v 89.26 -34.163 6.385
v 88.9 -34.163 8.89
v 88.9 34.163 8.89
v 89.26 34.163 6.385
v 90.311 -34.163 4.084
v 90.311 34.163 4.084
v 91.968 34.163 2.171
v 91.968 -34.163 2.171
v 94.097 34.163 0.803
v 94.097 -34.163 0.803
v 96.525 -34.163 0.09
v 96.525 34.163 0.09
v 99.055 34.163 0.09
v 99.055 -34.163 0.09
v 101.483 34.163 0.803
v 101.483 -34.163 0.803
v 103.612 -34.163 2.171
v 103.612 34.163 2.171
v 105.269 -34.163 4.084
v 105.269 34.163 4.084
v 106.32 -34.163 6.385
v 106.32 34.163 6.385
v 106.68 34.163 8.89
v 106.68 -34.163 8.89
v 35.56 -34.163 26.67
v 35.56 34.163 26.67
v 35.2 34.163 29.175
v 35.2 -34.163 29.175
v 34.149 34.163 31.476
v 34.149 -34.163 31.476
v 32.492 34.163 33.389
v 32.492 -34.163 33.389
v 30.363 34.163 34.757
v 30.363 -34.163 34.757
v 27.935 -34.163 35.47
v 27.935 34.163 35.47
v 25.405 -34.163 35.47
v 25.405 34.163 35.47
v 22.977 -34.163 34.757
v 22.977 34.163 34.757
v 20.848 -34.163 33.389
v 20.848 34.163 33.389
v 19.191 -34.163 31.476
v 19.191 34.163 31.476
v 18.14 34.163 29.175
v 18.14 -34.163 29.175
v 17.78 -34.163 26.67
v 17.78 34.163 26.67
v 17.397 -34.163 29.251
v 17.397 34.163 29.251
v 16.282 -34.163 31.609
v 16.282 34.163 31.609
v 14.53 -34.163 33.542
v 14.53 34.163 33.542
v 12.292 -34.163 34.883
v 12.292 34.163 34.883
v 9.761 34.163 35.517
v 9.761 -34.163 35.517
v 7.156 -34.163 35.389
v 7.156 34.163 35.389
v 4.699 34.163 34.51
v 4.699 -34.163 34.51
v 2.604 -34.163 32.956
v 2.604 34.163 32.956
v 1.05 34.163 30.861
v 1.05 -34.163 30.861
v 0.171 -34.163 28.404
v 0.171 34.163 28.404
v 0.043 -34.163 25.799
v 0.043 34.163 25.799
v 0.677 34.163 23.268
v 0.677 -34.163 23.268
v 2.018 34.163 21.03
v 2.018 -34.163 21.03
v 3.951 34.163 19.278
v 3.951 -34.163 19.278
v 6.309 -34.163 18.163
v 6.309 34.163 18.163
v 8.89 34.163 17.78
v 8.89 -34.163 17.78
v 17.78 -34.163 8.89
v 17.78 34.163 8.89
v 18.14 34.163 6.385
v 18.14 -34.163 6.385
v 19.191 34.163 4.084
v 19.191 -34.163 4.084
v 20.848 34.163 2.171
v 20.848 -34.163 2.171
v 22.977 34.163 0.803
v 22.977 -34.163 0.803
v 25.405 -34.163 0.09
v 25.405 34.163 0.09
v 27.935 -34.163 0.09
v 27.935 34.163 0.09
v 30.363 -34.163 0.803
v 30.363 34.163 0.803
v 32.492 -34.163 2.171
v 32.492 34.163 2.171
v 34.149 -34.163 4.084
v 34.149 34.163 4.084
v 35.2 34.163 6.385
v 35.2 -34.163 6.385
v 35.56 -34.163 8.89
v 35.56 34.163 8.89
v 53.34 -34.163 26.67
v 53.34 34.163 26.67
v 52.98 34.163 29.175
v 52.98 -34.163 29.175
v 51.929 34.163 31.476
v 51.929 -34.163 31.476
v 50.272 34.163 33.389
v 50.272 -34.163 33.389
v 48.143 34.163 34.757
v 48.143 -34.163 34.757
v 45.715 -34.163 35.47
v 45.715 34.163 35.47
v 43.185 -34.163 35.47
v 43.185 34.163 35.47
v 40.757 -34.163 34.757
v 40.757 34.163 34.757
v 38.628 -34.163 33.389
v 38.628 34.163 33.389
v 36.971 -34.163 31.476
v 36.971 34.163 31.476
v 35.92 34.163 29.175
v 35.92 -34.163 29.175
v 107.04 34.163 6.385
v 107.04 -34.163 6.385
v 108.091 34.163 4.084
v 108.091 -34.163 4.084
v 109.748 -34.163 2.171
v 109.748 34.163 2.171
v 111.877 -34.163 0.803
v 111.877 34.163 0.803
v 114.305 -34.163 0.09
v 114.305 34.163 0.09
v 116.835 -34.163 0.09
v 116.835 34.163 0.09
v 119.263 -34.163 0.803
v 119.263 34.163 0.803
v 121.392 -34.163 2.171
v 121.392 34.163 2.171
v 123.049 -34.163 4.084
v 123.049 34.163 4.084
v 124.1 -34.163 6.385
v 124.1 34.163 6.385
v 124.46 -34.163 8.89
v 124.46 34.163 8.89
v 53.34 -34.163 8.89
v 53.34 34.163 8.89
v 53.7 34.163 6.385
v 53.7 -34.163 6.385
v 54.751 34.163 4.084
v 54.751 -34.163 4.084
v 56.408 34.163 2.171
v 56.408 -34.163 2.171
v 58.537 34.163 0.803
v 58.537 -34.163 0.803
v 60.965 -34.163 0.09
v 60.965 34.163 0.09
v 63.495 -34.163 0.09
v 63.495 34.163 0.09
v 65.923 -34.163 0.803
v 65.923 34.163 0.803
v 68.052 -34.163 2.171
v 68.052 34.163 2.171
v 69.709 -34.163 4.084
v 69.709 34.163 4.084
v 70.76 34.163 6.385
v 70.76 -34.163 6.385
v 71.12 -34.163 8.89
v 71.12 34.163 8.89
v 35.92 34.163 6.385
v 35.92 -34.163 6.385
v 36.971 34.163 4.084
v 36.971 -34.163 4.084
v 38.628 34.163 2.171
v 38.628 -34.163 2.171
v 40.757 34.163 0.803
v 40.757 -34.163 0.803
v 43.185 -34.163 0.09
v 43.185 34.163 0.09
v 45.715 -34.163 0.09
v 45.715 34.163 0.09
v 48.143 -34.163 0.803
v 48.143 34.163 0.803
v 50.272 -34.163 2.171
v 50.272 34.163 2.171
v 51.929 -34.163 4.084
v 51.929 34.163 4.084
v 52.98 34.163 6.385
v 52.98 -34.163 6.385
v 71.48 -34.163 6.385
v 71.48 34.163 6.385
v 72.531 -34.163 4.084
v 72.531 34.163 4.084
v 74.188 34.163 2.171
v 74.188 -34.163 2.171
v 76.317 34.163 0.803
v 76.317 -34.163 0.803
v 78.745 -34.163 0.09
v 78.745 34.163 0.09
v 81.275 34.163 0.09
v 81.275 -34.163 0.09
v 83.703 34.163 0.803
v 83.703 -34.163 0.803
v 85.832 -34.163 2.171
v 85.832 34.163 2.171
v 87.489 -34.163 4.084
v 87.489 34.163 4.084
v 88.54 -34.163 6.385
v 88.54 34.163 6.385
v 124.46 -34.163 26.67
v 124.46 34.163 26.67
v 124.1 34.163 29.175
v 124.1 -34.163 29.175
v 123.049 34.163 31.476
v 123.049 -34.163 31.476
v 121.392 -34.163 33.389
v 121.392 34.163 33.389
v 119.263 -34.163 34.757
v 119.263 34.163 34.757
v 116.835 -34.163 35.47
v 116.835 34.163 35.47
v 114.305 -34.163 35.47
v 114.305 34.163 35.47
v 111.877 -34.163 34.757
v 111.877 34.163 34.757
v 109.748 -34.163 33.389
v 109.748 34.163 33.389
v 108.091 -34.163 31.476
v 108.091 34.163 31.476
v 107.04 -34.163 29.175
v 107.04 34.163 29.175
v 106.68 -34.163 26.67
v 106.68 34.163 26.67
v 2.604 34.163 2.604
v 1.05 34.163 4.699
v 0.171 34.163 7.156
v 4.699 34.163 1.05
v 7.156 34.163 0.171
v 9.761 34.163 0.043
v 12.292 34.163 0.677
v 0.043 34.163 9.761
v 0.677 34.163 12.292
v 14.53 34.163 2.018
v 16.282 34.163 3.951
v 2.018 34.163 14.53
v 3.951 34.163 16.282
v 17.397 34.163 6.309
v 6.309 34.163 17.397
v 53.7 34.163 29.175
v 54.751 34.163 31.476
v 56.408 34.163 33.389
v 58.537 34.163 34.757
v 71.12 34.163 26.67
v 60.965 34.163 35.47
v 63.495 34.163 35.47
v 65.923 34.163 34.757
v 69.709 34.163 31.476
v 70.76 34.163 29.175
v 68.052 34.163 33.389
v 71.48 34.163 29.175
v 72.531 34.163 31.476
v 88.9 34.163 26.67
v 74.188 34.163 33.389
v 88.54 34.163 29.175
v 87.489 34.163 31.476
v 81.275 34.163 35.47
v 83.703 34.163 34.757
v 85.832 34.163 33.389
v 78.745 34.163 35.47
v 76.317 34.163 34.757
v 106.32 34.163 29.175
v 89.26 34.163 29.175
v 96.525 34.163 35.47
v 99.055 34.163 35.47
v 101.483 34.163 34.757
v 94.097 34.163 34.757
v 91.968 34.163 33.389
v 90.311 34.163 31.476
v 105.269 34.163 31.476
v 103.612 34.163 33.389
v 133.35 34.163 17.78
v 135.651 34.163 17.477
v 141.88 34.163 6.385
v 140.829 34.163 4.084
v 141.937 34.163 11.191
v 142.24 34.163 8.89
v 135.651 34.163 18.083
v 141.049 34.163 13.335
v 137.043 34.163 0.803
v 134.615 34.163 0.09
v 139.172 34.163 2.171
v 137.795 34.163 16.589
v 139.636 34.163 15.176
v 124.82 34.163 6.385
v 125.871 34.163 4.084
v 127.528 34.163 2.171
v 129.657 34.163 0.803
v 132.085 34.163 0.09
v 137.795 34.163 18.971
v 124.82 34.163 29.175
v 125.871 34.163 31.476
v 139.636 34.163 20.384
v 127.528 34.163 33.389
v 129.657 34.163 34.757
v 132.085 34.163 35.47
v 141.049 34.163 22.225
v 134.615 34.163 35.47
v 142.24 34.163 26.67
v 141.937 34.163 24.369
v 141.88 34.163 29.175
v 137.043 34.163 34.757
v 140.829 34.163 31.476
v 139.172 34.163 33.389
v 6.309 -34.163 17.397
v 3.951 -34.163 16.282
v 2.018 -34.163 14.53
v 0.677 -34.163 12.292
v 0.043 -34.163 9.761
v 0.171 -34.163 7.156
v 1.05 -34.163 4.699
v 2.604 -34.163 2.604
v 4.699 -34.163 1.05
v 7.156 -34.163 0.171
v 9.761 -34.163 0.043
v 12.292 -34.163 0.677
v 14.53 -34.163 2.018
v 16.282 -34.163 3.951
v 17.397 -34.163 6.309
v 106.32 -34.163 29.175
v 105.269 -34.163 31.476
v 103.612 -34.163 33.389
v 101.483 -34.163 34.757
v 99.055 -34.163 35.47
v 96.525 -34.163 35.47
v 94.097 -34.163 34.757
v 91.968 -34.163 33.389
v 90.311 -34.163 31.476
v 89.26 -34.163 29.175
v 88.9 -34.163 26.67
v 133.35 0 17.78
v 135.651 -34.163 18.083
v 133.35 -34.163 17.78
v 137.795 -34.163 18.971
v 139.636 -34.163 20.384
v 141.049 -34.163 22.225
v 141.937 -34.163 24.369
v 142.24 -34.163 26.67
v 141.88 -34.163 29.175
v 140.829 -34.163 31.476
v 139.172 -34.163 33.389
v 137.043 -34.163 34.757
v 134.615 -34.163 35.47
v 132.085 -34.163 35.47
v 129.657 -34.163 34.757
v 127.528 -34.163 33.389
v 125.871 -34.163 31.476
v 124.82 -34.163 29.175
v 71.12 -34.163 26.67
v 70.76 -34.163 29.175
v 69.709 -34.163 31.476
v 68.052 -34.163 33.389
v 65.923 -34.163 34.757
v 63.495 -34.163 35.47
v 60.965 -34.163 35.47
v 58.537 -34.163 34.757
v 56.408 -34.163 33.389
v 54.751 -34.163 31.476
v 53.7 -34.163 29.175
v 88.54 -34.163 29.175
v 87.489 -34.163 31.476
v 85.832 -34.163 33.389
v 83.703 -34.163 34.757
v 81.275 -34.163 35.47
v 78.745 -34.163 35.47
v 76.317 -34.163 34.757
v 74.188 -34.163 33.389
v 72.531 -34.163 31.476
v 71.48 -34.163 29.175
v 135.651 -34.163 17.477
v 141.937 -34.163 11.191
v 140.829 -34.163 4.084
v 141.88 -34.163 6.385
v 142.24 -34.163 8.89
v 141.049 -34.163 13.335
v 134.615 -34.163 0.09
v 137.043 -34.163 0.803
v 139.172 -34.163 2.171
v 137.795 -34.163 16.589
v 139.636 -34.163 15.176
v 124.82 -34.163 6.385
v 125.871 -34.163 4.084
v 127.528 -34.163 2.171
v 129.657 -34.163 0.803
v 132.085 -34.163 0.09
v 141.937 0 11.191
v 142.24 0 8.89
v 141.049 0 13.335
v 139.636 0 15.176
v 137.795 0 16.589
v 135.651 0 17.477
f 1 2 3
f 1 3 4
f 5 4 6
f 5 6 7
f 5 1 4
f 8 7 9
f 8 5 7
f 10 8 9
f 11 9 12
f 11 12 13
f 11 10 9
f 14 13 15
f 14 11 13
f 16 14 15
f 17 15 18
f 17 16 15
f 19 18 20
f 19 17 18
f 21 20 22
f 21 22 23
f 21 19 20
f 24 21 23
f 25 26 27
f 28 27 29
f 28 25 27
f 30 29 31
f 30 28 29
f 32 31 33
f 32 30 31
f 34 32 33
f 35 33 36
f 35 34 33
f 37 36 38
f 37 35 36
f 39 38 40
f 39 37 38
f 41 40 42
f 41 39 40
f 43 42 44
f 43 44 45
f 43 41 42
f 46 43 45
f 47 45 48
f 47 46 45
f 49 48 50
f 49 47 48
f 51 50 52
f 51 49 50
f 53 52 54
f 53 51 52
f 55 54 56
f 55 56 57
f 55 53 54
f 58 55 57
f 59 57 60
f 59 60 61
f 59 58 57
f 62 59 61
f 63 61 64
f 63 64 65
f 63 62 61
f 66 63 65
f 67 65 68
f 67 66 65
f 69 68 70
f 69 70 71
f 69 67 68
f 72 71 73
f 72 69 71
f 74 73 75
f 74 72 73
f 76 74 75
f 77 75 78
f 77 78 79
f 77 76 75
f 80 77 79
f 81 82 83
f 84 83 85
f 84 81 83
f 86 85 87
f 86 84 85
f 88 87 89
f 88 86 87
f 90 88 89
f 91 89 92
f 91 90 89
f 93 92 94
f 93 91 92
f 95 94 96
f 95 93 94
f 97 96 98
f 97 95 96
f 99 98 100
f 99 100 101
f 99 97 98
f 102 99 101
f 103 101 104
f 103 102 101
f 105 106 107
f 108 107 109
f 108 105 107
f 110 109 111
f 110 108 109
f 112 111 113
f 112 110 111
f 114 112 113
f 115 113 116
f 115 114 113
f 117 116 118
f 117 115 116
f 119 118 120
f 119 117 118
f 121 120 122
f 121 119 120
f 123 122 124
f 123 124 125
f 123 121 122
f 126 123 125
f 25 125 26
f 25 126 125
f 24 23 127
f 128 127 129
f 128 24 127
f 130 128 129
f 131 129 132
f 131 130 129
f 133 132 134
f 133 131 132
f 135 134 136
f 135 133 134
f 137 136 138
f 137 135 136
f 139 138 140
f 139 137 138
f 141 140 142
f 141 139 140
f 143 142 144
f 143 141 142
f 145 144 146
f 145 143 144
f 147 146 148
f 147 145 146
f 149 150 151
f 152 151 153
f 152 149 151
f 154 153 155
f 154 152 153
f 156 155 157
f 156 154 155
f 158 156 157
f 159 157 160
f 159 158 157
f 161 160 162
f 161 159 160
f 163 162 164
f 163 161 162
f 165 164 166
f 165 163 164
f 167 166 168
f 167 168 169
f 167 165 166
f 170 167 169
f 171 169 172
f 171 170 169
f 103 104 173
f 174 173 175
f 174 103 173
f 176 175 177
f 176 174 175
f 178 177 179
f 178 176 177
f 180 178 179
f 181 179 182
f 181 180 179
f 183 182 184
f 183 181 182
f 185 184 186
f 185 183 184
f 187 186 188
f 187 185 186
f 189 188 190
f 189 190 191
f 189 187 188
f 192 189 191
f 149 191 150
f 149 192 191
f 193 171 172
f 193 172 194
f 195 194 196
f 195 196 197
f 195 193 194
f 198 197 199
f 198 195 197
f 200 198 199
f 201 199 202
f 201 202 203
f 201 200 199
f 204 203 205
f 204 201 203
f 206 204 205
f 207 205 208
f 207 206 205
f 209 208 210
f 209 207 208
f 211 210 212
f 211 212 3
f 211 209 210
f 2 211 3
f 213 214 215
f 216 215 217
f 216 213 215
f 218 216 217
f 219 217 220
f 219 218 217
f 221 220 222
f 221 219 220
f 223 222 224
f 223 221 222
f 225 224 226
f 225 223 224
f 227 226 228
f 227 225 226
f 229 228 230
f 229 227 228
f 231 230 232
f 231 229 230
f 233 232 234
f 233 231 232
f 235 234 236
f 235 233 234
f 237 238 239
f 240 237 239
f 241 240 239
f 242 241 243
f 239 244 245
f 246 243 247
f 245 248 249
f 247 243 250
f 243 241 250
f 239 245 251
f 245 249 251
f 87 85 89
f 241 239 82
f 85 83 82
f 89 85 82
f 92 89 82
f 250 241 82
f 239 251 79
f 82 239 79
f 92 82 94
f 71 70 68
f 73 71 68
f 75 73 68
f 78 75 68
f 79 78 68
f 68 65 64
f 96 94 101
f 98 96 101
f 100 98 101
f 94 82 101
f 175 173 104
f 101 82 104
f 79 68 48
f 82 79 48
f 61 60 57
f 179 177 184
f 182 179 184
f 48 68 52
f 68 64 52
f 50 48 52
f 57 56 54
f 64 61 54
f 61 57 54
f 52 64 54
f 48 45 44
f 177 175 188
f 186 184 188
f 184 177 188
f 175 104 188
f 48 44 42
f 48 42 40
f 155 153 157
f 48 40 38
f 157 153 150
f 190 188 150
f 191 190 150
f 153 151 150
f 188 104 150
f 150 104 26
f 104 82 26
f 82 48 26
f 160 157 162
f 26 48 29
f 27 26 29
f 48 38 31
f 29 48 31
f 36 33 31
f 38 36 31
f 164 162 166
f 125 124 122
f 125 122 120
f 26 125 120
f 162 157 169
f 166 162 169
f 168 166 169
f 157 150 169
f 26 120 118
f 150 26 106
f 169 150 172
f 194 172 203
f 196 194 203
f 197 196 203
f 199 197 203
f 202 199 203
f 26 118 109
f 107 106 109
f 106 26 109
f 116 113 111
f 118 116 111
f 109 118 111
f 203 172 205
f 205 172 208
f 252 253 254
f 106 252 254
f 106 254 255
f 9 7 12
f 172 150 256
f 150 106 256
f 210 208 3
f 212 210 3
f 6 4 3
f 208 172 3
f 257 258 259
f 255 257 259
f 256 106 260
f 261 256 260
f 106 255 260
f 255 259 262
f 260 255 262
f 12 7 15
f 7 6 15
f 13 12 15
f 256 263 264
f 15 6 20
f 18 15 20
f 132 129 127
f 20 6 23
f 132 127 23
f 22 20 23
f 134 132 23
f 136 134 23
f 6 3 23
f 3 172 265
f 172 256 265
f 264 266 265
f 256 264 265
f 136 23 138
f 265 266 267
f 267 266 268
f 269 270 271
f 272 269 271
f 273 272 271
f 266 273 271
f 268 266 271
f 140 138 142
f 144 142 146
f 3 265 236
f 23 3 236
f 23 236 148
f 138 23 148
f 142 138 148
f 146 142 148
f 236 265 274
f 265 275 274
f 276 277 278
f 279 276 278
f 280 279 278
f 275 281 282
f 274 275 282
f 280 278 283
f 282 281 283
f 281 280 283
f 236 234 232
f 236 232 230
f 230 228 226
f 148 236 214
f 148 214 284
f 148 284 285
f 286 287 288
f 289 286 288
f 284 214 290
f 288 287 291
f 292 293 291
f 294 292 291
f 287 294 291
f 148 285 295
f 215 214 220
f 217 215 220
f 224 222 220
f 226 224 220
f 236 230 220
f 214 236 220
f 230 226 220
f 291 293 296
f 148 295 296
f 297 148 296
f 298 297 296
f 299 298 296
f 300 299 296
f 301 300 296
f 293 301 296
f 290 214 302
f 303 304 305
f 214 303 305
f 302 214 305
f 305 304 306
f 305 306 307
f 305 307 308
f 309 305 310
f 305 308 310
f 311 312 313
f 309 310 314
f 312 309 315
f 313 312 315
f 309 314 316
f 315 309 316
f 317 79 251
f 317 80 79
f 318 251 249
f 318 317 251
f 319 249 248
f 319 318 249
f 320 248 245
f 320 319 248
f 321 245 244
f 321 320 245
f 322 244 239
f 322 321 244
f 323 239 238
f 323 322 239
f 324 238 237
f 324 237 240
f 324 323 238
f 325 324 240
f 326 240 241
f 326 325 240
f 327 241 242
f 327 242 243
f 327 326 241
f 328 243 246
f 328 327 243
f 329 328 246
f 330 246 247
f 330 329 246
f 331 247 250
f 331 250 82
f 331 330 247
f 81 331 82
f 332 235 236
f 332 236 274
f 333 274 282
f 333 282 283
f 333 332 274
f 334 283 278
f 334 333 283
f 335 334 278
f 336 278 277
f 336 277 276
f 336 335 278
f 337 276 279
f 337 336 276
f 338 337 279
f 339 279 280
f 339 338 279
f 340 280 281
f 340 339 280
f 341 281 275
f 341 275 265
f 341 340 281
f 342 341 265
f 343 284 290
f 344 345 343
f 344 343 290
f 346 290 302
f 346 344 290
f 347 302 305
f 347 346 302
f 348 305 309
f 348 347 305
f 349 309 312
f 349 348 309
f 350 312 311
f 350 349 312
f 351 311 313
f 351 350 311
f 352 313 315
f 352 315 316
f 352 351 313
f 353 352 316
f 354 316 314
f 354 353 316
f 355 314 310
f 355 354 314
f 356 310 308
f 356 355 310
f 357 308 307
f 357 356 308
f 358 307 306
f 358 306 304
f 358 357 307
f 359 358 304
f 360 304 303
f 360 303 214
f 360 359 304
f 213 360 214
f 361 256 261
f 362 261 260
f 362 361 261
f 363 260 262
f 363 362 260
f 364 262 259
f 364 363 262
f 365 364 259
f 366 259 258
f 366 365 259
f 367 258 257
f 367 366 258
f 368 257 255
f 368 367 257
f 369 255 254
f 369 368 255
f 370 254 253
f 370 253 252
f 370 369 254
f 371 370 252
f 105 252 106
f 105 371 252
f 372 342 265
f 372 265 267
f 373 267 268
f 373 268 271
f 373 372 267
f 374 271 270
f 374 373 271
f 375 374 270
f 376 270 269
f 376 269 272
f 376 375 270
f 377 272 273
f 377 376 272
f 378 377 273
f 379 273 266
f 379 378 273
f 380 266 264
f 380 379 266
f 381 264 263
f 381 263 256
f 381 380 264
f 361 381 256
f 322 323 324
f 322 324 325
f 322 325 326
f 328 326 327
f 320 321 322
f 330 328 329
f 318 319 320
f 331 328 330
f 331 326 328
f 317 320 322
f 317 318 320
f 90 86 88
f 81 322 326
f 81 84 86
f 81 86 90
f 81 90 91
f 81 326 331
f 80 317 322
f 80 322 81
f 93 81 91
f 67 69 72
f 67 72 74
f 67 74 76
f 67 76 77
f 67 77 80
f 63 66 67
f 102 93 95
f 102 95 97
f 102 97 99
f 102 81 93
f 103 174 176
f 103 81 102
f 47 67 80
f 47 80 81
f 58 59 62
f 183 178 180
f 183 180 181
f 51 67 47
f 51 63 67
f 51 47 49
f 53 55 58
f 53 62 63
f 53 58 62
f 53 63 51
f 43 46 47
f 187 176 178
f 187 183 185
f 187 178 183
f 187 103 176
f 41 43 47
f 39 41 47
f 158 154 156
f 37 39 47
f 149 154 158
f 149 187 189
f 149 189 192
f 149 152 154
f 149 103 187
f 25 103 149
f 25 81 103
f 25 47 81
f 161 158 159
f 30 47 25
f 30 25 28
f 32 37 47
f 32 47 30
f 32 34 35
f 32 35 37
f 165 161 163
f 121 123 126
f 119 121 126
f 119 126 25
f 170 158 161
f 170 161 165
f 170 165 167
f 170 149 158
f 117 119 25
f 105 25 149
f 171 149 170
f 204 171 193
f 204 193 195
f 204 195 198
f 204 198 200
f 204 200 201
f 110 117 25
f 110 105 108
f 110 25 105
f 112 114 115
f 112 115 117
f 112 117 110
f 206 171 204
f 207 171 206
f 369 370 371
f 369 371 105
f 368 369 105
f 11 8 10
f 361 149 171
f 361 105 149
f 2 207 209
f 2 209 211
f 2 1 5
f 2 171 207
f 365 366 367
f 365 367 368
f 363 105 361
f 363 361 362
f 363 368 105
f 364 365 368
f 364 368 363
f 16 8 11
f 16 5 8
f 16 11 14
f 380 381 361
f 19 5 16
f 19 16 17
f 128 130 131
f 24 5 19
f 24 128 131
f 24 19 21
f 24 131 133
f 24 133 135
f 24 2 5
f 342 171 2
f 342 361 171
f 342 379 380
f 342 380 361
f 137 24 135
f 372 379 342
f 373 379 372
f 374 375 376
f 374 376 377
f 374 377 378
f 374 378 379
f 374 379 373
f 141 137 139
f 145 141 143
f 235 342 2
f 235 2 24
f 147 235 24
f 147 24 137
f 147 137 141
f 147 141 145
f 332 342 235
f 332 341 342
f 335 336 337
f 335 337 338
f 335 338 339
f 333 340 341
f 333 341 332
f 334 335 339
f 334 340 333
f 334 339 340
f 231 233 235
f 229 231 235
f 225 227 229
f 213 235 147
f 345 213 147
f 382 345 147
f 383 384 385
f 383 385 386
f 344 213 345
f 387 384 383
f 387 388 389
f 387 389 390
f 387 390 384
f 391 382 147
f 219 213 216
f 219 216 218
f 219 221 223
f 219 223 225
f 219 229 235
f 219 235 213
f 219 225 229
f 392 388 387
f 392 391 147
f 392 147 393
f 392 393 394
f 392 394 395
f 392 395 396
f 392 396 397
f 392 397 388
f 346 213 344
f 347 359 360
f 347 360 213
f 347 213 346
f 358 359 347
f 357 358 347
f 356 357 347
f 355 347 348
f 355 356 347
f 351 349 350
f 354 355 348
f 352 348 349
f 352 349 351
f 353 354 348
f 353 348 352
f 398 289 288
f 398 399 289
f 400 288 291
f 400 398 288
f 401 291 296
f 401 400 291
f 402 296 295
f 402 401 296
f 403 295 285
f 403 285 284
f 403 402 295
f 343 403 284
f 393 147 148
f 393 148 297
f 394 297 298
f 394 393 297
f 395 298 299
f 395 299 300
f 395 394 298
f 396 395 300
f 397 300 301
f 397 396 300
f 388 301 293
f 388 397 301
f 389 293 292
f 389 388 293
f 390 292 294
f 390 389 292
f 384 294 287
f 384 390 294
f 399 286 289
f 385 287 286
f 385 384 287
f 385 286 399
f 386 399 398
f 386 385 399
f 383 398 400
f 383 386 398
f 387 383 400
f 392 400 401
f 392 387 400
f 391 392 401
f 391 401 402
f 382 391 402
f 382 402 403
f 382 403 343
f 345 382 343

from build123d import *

# Parameters (mm, degrees)
F1_DEPTH = 34.163


with BuildPart() as f1:
    # F0 (on Front) → F1 (new body, symmetric)
    with BuildSketch(Plane.XZ):
        with BuildLine():
            ThreePointArc((8.8900000424, 17.78), (2.6038207003, 2.6038207302), (17.78, 8.89))
            ThreePointArc((17.78, 8.89), (15.1761792997, 15.1761792698), (8.8900000424, 17.78))
        make_face()
        with BuildLine():
            ThreePointArc((26.67, 17.78), (20.3838207153, 15.1761792847), (17.78, 8.89))
            ThreePointArc((17.78, 8.89), (26.67, 0), (35.56, 8.89))
            ThreePointArc((35.56, 8.89), (32.9561792847, 15.1761792847), (26.67, 17.78))
        make_face()
        with BuildLine():
            ThreePointArc((8.8900000424, 17.78), (15.1761792997, 15.1761792698), (17.78, 8.89))
            ThreePointArc((17.78, 8.89), (20.3838207153, 15.1761792847), (26.67, 17.78))
            ThreePointArc((26.67, 17.78), (20.3838207153, 20.3838207153), (17.78, 26.67))
            ThreePointArc((17.78, 26.67), (15.1761792997, 20.3838207302), (8.8900000424, 17.78))
        make_face()
        with BuildLine():
            ThreePointArc((17.78, 26.67), (2.6038207003, 32.9561792698), (8.8900000424, 17.78))
            ThreePointArc((8.8900000424, 17.78), (15.1761792997, 20.3838207302), (17.78, 26.67))
        make_face()
        with BuildLine():
            ThreePointArc((44.45, 17.78), (38.1638207153, 15.1761792847), (35.56, 8.89))
            ThreePointArc((35.56, 8.89), (44.45, 0), (53.34, 8.89))
            ThreePointArc((53.34, 8.89), (50.7361792847, 15.1761792847), (44.45, 17.78))
        make_face()
        with BuildLine():
            ThreePointArc((26.67, 17.78), (32.9561792847, 15.1761792847), (35.56, 8.89))
            ThreePointArc((35.56, 8.89), (38.1638207153, 15.1761792847), (44.45, 17.78))
            ThreePointArc((44.45, 17.78), (38.1638207153, 20.3838207153), (35.56, 26.67))
            ThreePointArc((35.56, 26.67), (32.9561792847, 20.3838207153), (26.67, 17.78))
        make_face()
        with BuildLine():
            ThreePointArc((17.78, 26.67), (20.3838207153, 20.3838207153), (26.67, 17.78))
            ThreePointArc((26.67, 17.78), (32.9561792847, 20.3838207153), (35.56, 26.67))
            ThreePointArc((35.56, 26.67), (26.67, 35.56), (17.78, 26.67))
        make_face()
        with BuildLine():
            ThreePointArc((62.23, 17.78), (55.9438207153, 15.1761792847), (53.34, 8.89))
            ThreePointArc((53.34, 8.89), (62.23, 0), (71.12, 8.89))
            ThreePointArc((71.12, 8.89), (68.5161792847, 15.1761792847), (62.23, 17.78))
        make_face()
        with BuildLine():
            ThreePointArc((44.45, 17.78), (50.7361792847, 15.1761792847), (53.34, 8.89))
            ThreePointArc((53.34, 8.89), (55.9438207153, 15.1761792847), (62.23, 17.78))
            ThreePointArc((62.23, 17.78), (55.9438207153, 20.3838207153), (53.34, 26.67))
            ThreePointArc((53.34, 26.67), (50.7361792847, 20.3838207153), (44.45, 17.78))
        make_face()
        with BuildLine():
            ThreePointArc((35.56, 26.67), (38.1638207153, 20.3838207153), (44.45, 17.78))
            ThreePointArc((44.45, 17.78), (50.7361792847, 20.3838207153), (53.34, 26.67))
            ThreePointArc((53.34, 26.67), (44.45, 35.56), (35.56, 26.67))
        make_face()
        with BuildLine():
            ThreePointArc((80.01, 17.78), (73.7238207153, 15.1761792847), (71.12, 8.89))
            ThreePointArc((71.12, 8.89), (80.01, 0), (88.9, 8.89))
            ThreePointArc((88.9, 8.89), (86.2961792847, 15.1761792847), (80.01, 17.78))
        make_face()
        with BuildLine():
            ThreePointArc((62.23, 17.78), (68.5161792847, 15.1761792847), (71.12, 8.89))
            ThreePointArc((71.12, 8.89), (73.7238207153, 15.1761792847), (80.01, 17.78))
            ThreePointArc((80.01, 17.78), (73.7238207153, 20.3838207153), (71.12, 26.67))
            ThreePointArc((71.12, 26.67), (68.5161792847, 20.3838207153), (62.23, 17.78))
        make_face()
        with BuildLine():
            ThreePointArc((53.34, 26.67), (55.9438207153, 20.3838207153), (62.23, 17.78))
            ThreePointArc((62.23, 17.78), (68.5161792847, 20.3838207153), (71.12, 26.67))
            ThreePointArc((71.12, 26.67), (62.23, 35.56), (53.34, 26.67))
        make_face()
        with BuildLine():
            ThreePointArc((97.79, 17.78), (91.5038207153, 15.1761792847), (88.9, 8.89))
            ThreePointArc((88.9, 8.89), (97.79, 0), (106.68, 8.89))
            ThreePointArc((106.68, 8.89), (104.0761792847, 15.1761792847), (97.79, 17.78))
        make_face()
        with BuildLine():
            ThreePointArc((80.01, 17.78), (86.2961792847, 15.1761792847), (88.9, 8.89))
            ThreePointArc((88.9, 8.89), (91.5038207153, 15.1761792847), (97.79, 17.78))
            ThreePointArc((97.79, 17.78), (91.5038207153, 20.3838207153), (88.9, 26.67))
            ThreePointArc((88.9, 26.67), (86.2961792847, 20.3838207153), (80.01, 17.78))
        make_face()
        with BuildLine():
            ThreePointArc((71.12, 26.67), (73.7238207153, 20.3838207153), (80.01, 17.78))
            ThreePointArc((80.01, 17.78), (86.2961792847, 20.3838207153), (88.9, 26.67))
            ThreePointArc((88.9, 26.67), (80.01, 35.56), (71.12, 26.67))
        make_face()
        with BuildLine():
            ThreePointArc((115.57, 17.78), (109.2838207153, 15.1761792847), (106.68, 8.89))
            ThreePointArc((106.68, 8.89), (115.57, 0), (124.46, 8.89))
            ThreePointArc((124.46, 8.89), (121.8561792847, 15.1761792847), (115.57, 17.78))
        make_face()
        with BuildLine():
            ThreePointArc((97.79, 17.78), (104.0761792847, 15.1761792847), (106.68, 8.89))
            ThreePointArc((106.68, 8.89), (109.2838207153, 15.1761792847), (115.57, 17.78))
            ThreePointArc((115.57, 17.78), (109.2838207153, 20.3838207153), (106.68, 26.67))
            ThreePointArc((106.68, 26.67), (104.0761792847, 20.3838207153), (97.79, 17.78))
        make_face()
        with BuildLine():
            ThreePointArc((88.9, 26.67), (91.5038207153, 20.3838207153), (97.79, 17.78))
            ThreePointArc((97.79, 17.78), (104.0761792847, 20.3838207153), (106.68, 26.67))
            ThreePointArc((106.68, 26.67), (97.79, 35.56), (88.9, 26.67))
        make_face()
        with BuildLine():
            ThreePointArc((133.35, 17.78), (127.0638207153, 15.1761792847), (124.46, 8.89))
            ThreePointArc((124.46, 8.89), (133.35, 0), (142.24, 8.89))
            ThreePointArc((142.24, 8.89), (139.6361792847, 15.1761792847), (133.35, 17.78))
        make_face()
        with BuildLine():
            ThreePointArc((115.57, 17.78), (121.8561792847, 15.1761792847), (124.46, 8.89))
            ThreePointArc((124.46, 8.89), (127.0638207153, 15.1761792847), (133.35, 17.78))
            ThreePointArc((133.35, 17.78), (127.0638207153, 20.3838207153), (124.46, 26.67))
            ThreePointArc((124.46, 26.67), (121.8561792847, 20.3838207153), (115.57, 17.78))
        make_face()
        with BuildLine():
            ThreePointArc((106.68, 26.67), (109.2838207153, 20.3838207153), (115.57, 17.78))
            ThreePointArc((115.57, 17.78), (121.8561792847, 20.3838207153), (124.46, 26.67))
            ThreePointArc((124.46, 26.67), (115.57, 35.56), (106.68, 26.67))
        make_face()
        with BuildLine():
            ThreePointArc((124.46, 26.67), (127.0638207153, 20.3838207153), (133.35, 17.78))
            ThreePointArc((133.35, 17.78), (139.6361792847, 20.3838207153), (142.24, 26.67))
            ThreePointArc((142.24, 26.67), (133.35, 35.56), (124.46, 26.67))
        make_face()
    extrude(amount=F1_DEPTH, both=True)


solid = f1.part
